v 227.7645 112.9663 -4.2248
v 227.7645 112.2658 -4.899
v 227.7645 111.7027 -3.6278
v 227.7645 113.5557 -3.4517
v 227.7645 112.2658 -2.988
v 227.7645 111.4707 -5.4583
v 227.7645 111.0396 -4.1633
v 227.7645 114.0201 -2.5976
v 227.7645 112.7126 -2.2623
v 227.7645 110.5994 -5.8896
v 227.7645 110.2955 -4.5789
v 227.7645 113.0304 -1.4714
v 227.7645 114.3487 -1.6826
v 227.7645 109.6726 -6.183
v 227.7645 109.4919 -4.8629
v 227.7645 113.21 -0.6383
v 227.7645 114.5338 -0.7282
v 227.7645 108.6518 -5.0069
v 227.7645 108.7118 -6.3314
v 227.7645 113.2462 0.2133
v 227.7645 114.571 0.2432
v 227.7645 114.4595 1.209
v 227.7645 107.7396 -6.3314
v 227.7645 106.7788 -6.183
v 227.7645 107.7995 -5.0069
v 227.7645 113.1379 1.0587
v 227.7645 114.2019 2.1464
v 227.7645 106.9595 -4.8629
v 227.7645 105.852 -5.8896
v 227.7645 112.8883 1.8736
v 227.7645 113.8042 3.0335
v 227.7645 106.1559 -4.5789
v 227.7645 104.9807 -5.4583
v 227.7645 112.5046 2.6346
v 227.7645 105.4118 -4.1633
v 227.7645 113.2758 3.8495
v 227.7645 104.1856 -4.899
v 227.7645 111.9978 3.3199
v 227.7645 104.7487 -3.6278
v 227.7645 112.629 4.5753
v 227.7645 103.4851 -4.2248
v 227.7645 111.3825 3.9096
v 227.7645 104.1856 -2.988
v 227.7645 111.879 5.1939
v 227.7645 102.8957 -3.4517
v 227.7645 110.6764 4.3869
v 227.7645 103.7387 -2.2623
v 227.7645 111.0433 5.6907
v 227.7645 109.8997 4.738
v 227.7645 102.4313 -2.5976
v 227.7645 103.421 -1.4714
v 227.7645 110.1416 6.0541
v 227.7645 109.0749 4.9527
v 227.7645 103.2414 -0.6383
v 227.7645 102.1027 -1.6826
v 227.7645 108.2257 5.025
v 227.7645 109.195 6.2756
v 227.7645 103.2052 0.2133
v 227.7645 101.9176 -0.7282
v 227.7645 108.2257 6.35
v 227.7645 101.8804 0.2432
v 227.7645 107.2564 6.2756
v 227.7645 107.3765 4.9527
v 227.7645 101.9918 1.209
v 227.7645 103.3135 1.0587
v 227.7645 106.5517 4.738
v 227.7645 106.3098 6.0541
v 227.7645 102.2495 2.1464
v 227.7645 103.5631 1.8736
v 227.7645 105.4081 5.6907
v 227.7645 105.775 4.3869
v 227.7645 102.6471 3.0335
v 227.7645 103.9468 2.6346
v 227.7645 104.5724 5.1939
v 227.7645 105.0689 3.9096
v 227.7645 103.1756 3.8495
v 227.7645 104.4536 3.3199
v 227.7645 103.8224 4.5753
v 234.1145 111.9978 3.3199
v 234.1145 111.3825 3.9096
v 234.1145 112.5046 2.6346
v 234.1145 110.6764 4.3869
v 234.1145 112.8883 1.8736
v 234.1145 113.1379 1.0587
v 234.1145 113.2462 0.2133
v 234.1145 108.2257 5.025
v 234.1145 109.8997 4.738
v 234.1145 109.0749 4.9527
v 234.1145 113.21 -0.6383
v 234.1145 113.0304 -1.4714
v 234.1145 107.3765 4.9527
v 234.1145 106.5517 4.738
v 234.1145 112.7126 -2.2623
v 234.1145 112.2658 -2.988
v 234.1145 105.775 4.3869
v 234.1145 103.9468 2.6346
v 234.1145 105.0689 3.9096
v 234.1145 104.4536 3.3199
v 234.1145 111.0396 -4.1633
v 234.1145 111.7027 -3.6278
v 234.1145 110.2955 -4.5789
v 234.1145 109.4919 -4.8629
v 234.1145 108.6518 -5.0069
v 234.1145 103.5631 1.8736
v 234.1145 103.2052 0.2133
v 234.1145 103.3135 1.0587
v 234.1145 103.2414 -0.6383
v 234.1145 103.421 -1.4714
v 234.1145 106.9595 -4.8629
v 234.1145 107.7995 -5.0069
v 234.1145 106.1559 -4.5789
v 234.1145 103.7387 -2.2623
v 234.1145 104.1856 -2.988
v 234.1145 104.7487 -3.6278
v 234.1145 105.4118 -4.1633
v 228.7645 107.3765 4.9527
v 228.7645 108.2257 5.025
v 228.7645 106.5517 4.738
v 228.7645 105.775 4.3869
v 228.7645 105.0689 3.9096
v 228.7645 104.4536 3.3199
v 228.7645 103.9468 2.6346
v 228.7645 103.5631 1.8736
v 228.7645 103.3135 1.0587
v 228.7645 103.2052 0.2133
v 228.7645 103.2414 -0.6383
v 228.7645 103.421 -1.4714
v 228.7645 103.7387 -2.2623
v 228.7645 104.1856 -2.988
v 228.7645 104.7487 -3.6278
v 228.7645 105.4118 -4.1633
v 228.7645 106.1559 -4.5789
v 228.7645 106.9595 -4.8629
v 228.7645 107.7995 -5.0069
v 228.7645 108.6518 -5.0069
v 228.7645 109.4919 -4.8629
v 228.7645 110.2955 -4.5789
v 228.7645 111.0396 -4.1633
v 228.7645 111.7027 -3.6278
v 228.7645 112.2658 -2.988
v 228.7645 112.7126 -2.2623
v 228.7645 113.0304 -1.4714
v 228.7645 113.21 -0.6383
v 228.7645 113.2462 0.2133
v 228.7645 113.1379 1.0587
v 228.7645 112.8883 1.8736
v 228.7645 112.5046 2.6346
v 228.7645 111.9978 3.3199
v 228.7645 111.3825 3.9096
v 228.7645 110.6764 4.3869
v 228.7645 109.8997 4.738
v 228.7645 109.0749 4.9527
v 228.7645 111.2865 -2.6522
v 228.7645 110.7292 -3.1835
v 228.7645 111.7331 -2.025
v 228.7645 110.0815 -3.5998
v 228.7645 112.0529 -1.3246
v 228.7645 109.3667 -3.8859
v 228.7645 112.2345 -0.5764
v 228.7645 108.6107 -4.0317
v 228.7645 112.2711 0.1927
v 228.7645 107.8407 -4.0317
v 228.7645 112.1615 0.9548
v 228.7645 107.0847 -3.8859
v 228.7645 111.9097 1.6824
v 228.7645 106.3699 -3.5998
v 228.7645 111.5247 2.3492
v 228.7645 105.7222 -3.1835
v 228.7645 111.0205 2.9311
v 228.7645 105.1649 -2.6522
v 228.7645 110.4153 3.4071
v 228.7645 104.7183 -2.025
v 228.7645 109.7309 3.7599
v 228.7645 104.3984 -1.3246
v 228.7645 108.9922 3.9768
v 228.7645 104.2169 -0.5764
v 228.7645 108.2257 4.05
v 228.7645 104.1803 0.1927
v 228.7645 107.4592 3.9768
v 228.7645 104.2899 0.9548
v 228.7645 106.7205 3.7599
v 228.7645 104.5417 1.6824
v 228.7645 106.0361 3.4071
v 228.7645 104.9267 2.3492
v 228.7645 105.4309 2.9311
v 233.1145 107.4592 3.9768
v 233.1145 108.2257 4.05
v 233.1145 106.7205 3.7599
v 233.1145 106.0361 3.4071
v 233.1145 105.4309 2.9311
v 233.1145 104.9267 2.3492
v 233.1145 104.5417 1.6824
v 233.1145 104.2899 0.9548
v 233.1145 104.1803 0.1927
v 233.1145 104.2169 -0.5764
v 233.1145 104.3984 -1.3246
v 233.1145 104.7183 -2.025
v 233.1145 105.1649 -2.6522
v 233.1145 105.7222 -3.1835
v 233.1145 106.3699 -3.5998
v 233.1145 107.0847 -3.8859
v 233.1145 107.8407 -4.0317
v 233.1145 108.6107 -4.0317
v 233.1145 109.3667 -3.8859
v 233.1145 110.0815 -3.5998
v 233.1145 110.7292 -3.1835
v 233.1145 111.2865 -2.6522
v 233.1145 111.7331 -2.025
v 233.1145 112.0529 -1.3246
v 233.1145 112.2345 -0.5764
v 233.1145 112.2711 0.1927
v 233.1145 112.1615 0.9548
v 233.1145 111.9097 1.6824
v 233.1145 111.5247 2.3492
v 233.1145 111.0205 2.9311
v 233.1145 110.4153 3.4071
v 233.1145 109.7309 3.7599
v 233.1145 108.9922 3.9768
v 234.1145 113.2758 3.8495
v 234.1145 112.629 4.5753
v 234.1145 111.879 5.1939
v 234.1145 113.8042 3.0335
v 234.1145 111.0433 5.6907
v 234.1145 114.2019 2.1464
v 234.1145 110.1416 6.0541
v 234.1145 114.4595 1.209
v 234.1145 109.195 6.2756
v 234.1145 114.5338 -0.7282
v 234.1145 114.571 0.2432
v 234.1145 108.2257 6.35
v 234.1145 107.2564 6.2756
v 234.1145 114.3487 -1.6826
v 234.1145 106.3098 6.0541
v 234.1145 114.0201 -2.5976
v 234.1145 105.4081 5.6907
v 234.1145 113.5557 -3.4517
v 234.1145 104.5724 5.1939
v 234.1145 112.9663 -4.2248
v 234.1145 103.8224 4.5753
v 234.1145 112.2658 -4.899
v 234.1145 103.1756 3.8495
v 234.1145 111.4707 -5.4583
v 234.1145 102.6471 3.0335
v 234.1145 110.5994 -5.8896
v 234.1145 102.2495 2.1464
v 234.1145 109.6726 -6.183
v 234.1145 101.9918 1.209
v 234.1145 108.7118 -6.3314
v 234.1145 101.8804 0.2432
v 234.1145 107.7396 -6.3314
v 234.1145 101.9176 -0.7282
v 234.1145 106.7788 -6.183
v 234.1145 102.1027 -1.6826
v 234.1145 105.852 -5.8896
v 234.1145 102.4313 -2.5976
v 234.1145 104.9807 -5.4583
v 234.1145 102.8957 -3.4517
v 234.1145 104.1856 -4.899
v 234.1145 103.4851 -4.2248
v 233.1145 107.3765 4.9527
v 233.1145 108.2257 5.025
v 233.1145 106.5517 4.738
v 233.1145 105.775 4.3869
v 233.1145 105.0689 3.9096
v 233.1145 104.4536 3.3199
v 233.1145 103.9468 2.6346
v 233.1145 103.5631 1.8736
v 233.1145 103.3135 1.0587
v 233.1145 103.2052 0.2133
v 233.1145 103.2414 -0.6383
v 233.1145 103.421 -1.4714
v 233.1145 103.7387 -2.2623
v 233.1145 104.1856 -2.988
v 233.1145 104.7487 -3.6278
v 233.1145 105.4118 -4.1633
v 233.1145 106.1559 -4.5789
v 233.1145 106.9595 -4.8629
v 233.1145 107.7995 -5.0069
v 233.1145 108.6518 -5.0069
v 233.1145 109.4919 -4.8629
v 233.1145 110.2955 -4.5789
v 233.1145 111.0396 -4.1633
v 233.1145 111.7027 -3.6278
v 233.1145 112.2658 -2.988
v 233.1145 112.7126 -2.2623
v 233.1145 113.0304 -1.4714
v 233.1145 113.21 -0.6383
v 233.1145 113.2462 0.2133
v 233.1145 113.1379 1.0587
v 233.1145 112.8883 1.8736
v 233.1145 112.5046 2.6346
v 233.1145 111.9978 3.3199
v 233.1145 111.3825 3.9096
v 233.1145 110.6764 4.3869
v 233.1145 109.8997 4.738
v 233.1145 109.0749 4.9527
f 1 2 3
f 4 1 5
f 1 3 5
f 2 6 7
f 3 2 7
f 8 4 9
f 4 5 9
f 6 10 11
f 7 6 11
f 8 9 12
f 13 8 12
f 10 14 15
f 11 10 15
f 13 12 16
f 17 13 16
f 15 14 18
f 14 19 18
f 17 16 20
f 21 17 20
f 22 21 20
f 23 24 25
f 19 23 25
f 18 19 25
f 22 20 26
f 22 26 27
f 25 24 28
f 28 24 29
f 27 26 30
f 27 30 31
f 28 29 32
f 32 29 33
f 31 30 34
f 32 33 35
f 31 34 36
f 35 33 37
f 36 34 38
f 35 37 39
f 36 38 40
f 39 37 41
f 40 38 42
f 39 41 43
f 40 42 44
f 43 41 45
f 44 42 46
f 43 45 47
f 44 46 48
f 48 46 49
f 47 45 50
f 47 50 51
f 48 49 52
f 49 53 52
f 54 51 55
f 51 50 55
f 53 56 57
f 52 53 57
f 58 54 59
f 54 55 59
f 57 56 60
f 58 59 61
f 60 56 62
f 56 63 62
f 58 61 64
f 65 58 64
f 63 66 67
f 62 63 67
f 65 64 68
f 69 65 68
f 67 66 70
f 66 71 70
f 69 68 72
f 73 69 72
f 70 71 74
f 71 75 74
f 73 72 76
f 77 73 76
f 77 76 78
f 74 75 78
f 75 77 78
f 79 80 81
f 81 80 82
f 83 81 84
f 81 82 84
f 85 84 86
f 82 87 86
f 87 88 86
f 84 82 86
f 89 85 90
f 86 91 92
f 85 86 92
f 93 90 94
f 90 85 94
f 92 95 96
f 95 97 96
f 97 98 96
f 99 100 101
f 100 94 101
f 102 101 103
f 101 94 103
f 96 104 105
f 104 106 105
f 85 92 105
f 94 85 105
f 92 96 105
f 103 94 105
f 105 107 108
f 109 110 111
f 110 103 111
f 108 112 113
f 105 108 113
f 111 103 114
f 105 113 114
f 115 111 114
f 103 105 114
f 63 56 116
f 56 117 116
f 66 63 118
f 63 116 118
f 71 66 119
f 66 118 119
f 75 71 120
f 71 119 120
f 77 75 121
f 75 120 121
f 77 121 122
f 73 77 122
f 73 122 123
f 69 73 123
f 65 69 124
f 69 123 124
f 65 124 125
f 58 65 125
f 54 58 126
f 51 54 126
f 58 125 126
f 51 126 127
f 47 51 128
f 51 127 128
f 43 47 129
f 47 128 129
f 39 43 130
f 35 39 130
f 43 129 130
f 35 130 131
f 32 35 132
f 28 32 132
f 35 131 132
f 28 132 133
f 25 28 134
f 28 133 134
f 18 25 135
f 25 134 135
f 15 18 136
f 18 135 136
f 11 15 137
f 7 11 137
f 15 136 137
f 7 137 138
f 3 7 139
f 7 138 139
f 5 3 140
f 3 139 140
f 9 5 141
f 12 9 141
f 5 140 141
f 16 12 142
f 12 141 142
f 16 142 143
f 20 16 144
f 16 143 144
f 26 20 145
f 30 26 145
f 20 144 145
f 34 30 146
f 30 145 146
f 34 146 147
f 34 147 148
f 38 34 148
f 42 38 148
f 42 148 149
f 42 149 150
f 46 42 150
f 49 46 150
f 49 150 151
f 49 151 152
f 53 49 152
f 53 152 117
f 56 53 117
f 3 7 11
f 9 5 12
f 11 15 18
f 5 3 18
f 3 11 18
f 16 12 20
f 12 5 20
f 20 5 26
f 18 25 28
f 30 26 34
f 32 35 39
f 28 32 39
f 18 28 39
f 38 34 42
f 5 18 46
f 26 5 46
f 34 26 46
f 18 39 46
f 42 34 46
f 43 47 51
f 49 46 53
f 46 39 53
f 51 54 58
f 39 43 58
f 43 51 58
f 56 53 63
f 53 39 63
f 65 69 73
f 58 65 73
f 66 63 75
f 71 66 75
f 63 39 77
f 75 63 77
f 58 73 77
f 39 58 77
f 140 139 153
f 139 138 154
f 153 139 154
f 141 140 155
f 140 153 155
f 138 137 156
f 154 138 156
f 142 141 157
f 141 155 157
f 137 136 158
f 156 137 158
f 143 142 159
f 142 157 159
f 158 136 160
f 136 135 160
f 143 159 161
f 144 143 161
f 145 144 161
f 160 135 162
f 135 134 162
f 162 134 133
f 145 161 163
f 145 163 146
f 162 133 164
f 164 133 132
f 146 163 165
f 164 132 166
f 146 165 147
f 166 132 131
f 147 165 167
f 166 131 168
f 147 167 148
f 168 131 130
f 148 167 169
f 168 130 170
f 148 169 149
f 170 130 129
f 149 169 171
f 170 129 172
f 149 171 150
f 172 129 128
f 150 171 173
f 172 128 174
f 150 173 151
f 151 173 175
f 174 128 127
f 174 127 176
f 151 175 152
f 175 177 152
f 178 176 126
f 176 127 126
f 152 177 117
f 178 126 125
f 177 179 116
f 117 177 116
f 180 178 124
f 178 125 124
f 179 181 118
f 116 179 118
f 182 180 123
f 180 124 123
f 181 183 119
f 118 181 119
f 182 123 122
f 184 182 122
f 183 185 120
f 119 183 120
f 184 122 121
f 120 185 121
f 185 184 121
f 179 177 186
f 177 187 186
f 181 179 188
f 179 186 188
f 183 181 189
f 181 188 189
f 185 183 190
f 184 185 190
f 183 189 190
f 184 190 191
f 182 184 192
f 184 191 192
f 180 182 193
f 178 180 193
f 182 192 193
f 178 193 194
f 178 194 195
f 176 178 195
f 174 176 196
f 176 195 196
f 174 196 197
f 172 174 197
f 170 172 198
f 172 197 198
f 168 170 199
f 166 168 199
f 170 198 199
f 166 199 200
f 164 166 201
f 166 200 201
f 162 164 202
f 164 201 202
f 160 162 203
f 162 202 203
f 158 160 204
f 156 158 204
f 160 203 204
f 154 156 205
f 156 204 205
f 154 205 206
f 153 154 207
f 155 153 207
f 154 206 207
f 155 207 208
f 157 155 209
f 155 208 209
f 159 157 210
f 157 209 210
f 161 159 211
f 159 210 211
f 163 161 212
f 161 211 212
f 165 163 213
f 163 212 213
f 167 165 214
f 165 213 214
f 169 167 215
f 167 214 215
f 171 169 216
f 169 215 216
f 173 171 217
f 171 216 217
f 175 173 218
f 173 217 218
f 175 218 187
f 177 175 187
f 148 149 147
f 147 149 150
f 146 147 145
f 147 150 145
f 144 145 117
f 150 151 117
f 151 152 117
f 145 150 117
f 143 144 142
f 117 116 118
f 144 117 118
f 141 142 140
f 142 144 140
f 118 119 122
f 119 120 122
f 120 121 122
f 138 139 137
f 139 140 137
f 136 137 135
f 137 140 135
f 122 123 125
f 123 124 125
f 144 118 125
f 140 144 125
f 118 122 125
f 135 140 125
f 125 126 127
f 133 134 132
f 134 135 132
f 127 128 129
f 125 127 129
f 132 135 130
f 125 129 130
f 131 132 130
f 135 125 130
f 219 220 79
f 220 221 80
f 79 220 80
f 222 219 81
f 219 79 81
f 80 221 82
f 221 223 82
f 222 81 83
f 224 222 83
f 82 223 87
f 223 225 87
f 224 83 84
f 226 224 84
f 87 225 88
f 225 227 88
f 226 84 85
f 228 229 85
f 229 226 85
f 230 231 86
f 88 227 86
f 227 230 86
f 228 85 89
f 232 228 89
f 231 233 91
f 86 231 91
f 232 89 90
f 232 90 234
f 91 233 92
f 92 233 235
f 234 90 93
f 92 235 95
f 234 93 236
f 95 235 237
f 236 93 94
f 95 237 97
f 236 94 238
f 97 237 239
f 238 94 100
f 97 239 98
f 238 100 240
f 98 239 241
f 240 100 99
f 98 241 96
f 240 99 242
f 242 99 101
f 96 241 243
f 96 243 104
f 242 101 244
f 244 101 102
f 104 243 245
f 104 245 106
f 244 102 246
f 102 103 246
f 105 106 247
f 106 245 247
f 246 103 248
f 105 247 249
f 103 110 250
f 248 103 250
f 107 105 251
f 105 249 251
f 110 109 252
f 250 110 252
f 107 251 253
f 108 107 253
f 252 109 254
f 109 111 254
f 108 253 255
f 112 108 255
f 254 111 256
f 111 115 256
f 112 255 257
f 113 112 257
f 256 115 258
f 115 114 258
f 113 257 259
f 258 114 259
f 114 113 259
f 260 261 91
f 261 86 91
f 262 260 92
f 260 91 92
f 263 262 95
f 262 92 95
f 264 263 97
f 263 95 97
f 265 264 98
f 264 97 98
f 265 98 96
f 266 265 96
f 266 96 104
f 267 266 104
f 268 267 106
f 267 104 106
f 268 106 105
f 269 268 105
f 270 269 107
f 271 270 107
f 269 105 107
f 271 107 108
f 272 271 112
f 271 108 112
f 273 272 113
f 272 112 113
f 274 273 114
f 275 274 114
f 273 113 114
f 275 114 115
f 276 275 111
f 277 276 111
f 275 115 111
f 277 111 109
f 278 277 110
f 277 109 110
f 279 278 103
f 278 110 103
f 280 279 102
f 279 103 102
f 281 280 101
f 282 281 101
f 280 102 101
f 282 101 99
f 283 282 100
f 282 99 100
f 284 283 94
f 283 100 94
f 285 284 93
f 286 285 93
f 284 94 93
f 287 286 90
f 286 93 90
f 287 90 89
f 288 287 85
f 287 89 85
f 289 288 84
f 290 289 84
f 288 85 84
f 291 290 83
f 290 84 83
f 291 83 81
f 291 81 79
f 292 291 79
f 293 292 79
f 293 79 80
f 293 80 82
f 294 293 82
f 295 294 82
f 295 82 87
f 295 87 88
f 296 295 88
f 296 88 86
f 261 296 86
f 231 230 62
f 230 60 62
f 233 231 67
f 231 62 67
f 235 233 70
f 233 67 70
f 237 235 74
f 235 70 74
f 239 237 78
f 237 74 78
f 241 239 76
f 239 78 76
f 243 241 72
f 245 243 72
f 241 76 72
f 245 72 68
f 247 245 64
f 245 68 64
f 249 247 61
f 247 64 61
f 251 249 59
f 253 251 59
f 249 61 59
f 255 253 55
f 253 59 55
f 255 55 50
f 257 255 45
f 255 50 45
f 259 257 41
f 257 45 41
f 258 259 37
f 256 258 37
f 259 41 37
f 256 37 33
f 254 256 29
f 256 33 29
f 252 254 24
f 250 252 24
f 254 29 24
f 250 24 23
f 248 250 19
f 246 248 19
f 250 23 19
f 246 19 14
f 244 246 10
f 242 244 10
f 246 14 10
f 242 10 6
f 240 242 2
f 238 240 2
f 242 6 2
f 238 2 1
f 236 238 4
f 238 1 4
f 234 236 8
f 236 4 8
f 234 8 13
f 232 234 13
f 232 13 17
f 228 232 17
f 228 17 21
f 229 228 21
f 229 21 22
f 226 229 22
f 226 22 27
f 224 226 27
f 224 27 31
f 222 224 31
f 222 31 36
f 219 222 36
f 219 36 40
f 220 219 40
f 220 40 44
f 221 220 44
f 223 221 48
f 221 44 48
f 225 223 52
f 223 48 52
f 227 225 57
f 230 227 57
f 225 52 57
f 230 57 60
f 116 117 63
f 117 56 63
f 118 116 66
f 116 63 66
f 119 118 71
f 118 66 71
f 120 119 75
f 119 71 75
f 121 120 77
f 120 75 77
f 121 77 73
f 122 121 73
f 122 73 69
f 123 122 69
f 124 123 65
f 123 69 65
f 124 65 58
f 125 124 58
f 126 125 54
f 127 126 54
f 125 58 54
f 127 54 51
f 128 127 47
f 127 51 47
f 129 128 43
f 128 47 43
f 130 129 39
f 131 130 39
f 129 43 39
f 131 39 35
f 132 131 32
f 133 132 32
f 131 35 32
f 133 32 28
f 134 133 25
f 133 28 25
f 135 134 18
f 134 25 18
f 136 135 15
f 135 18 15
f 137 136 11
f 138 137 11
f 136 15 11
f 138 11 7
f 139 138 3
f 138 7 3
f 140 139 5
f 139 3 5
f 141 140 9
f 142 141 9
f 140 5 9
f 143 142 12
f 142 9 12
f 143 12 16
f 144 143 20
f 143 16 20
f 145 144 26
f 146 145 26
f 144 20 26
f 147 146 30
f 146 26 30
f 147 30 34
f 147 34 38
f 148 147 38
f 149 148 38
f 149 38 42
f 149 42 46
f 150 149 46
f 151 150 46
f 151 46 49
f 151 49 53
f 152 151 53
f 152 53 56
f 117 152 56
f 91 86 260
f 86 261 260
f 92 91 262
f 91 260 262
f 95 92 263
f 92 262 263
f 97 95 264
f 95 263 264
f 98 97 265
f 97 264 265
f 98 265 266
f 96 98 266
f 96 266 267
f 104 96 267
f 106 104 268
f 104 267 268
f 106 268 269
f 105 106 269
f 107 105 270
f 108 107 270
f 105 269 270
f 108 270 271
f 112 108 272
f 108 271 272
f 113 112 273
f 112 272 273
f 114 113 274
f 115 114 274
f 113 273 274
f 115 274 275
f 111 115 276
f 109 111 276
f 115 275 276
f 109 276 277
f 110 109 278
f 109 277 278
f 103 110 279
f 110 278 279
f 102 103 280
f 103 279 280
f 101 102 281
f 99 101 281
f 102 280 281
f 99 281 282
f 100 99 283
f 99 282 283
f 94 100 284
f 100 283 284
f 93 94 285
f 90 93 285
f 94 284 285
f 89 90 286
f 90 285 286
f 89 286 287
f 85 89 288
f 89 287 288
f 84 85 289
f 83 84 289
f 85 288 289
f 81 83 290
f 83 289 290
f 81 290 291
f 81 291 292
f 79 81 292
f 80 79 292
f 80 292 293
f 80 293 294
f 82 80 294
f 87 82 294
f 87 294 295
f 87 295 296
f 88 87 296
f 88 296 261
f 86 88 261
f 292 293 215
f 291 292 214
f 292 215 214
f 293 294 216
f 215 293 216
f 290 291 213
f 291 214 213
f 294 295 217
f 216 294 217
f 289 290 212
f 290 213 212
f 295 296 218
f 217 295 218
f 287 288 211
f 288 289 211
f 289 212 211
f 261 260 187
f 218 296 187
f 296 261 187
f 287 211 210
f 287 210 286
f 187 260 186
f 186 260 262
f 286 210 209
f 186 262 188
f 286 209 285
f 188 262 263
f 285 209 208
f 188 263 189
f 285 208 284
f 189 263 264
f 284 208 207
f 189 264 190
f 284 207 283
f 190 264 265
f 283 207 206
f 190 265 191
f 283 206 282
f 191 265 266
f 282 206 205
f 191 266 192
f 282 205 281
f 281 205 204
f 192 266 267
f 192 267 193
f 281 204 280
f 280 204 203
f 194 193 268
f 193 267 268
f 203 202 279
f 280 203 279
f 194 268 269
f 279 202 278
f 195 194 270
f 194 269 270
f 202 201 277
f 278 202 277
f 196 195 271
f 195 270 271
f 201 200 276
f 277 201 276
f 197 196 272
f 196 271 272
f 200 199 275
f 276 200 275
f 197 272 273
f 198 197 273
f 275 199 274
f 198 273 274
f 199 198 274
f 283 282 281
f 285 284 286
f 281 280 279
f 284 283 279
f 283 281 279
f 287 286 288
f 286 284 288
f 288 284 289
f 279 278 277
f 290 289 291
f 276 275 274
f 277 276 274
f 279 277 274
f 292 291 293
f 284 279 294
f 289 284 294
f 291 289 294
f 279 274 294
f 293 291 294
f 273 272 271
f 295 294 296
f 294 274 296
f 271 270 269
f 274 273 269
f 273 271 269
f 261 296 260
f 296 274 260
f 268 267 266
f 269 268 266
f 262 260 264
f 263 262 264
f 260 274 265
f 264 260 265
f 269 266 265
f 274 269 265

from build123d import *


with BuildPart() as part:
    # Sketch 1 → Revolve 1 (revolve)
    with BuildSketch(Plane.XY, mode=Mode.PRIVATE) as revolve_1_sk:
        Polygon((234.114519085, 114.575695895), (227.764519085, 114.575695895), (227.764519085, 113.250695895), (228.764519085, 113.250695895), (228.764519085, 112.275695895), (233.114519085, 112.275695895), (233.114519085, 113.250695895), (234.114519085, 113.250695895), align=None)
    revolve(revolve_1_sk.sketch.rotate(Axis((219.902332256, 108.225695895, 0), (1, 0, 0)), 90), axis=Axis((219.902332256, 108.225695895, 0), (1, 0, 0)))  # turned: the seam where the file's is


with BuildPart() as body_2:
    # Sketch 1_4 one side → Revolve 2 (revolve)
    with BuildSketch(Plane.XY, mode=Mode.PRIVATE) as revolve_2_sk:
        Polygon((228.764519085, 112.275695895), (228.764519085, 113.250695895), (227.764519085, 113.250695895), (227.764519085, 108.225695895), (228.764519085, 108.225695895), align=None)
    revolve(revolve_2_sk.sketch.rotate(Axis((219.902332256, 108.225695895, 0), (1, 0, 0)), 90), axis=Axis((219.902332256, 108.225695895, 0), (1, 0, 0)))  # turned: the seam where the file's is


with BuildPart() as body_3:
    # Sketch 1_5 one side → Revolve 3 (revolve)
    with BuildSketch(Plane.XY, mode=Mode.PRIVATE) as revolve_3_sk:
        Polygon((233.114519085, 108.225695895), (234.114519085, 108.225695895), (234.114519085, 113.250695895), (233.114519085, 113.250695895), (233.114519085, 112.275695895), align=None)
    revolve(revolve_3_sk.sketch.rotate(Axis((219.902332256, 108.225695895, 0), (1, 0, 0)), 90), axis=Axis((219.902332256, 108.225695895, 0), (1, 0, 0)))  # turned: the seam where the file's is


solid = Compound([part.part, body_2.part, body_3.part])
